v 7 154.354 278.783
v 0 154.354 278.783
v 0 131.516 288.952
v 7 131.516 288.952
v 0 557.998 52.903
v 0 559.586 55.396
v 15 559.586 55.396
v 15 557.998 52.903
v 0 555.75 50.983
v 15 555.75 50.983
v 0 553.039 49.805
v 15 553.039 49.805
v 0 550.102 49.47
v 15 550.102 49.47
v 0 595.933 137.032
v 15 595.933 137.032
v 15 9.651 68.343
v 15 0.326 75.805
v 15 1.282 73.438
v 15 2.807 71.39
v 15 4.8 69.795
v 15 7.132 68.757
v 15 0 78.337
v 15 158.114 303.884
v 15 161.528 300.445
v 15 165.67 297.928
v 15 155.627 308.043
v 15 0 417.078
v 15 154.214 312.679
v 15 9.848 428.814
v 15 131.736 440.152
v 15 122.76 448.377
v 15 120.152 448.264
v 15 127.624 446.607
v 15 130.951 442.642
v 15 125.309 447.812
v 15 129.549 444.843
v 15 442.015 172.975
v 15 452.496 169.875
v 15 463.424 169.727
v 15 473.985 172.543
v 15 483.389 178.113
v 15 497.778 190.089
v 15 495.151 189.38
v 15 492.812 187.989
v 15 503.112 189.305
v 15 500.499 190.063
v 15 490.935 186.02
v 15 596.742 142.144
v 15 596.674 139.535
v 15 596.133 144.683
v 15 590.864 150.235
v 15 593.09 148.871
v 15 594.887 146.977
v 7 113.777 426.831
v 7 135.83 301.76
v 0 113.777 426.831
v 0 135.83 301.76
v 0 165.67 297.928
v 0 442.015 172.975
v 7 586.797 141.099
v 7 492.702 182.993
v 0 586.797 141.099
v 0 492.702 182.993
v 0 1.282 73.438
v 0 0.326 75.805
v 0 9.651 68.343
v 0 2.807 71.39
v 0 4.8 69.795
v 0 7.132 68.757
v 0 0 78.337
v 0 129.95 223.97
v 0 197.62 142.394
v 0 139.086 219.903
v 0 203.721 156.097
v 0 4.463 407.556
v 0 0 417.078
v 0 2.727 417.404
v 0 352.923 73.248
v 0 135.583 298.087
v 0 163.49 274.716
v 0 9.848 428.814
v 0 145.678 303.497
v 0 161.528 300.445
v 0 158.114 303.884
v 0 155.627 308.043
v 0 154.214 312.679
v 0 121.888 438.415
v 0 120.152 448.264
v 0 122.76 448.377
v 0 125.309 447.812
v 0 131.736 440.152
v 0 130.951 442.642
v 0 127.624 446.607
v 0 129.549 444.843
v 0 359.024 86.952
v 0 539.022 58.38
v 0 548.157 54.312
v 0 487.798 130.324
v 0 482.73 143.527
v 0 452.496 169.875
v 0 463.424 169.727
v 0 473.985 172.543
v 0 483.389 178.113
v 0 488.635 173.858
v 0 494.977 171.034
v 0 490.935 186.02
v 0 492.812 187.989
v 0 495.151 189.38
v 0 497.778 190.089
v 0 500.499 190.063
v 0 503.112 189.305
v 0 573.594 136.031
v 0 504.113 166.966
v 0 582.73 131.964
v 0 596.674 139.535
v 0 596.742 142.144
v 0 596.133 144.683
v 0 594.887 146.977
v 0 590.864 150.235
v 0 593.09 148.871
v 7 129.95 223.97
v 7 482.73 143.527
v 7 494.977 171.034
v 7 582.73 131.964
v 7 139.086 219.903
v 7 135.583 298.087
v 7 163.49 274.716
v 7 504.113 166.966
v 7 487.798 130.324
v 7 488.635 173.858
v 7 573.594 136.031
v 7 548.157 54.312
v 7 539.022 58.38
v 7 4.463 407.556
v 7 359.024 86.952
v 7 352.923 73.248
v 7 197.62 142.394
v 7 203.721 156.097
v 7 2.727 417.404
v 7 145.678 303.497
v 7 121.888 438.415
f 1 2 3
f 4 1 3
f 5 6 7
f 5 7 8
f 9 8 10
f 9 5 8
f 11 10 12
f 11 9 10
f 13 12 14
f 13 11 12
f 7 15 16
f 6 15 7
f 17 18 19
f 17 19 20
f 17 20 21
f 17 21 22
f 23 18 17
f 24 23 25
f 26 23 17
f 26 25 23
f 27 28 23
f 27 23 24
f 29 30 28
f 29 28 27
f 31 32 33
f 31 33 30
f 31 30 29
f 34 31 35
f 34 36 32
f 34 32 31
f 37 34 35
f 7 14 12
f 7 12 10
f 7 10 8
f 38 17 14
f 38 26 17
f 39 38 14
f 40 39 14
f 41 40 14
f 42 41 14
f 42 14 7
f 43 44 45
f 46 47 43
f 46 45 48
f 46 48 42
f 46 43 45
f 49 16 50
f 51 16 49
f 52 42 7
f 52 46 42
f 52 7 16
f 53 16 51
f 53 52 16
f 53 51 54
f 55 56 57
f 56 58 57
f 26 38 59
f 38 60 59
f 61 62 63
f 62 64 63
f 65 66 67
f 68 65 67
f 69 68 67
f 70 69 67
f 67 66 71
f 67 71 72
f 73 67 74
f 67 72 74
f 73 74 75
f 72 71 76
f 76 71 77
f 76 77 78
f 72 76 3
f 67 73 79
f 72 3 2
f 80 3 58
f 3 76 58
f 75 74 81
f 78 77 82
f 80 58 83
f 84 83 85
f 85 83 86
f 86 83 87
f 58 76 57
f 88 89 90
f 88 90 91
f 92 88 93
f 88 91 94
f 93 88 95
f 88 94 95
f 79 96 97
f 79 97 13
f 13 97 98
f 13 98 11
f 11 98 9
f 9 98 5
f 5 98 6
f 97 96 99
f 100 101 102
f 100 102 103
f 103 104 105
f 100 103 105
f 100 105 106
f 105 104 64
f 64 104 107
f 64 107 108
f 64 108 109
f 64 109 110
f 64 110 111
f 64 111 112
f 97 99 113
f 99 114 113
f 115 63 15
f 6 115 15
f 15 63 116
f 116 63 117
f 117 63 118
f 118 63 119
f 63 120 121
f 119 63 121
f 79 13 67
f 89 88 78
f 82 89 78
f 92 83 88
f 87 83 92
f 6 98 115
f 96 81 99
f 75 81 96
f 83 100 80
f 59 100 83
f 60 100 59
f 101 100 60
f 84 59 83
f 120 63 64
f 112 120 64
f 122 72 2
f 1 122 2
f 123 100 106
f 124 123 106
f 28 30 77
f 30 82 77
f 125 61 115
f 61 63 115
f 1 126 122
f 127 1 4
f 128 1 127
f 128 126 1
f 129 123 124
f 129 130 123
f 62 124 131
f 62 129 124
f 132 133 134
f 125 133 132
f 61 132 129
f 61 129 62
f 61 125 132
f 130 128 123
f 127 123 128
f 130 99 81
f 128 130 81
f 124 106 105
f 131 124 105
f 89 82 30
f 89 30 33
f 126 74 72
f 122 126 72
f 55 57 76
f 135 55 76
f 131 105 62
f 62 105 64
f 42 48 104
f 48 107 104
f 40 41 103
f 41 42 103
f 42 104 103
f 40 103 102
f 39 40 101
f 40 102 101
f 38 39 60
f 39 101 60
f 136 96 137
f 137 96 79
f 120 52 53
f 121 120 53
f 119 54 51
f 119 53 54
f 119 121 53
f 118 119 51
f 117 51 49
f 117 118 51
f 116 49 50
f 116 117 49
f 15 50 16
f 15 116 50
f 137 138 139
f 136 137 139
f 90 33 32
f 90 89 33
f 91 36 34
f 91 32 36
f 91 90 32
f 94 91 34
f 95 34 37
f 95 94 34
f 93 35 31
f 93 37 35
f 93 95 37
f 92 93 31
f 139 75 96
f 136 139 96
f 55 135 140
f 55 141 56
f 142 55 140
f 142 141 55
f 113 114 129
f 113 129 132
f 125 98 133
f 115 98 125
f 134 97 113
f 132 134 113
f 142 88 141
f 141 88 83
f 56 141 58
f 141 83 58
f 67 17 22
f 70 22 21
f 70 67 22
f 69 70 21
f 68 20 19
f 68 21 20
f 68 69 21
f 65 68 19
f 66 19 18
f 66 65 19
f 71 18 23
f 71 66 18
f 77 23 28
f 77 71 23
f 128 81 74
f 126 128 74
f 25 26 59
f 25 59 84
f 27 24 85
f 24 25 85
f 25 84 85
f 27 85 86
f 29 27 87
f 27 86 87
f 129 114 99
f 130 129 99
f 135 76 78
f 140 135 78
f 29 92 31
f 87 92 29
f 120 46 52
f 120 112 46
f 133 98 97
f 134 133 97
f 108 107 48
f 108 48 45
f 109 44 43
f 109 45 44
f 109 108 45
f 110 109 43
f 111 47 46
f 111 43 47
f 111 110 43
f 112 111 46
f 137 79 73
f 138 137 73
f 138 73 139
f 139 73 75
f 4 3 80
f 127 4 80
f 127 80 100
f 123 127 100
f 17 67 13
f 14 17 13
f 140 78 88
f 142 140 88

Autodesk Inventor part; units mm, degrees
ref_plane "YZ Plane" through (0, 0, 0) normal (1, 0, 0) x (0, 1, 0)
ref_plane "XZ Plane" through (0, 0, 0) normal (0, 1, 0) x (-1, 0, 0)
ref_plane "XY Plane" through (0, 0, 0) normal (0, 0, 1) x (1, 0, 0)
sketch "Sketch1" plane through (0, 0, 0) normal (1, 0, 0) x (0, 1, 0)
  line L0 (9.8481, 428.814) -> (120.1519, 448.2635)
  line L1 (131.7365, 440.1519) -> (154.2135, 312.6787)
  line L2 (0, 78.3368) -> (0, 427.0775)
  line L3 (0, 417.0775) -> (0, 78.3368)
  line L4 (503.1119, 189.3047) -> (590.8645, 150.2346)
  line L5 (595.9326, 137.0318) -> (559.5861, 55.3964)
  line L6 (494.9423, 192.942) -> (494.9423, 192.942)
  line L7 (442.0149, 172.9748) -> (165.6696, 297.928)
  arc A0 (442.0149, 172.9748) -> (490.9347, 186.0198) centre (458.495, 209.4221) ccw
  arc A1 (154.2135, 312.6787) -> (165.6696, 297.928) centre (173.9096, 316.1516) ccw
  arc A2 (131.7365, 440.1519) -> (120.1519, 448.2635) centre (121.8884, 438.4154) ccw
  line L8 (9.8481, 428.814) -> (0, 417.0775)
  arc A3 (595.9326, 137.0318) -> (590.8645, 150.2346) centre (586.7972, 141.0991) ccw
  arc A4 (503.1119, 189.3047) -> (490.9347, 186.0198) centre (499.0446, 180.1692) ccw
  line L9 (9.651, 68.3429) -> (550.1017, 49.4699)
  arc A5 (550.1017, 49.4699) -> (559.5861, 55.3964) centre (550.4507, 59.4638) ccw
  arc A6 (0, 78.3368) -> (9.651, 68.3429) centre (10, 78.3368) ccw
  point P0 (0, 0)
  point P1 (0, 0)
  point P2 (130, 450)
  point P3 (156.0472, 302.2788)
  point P4 (0, 0)
  point P5 (534.922, 0)
  point P6 (600, 146.1672)
  point P7 (478.4622, 156.4947)
  point P8 (0, 427.0775)
  point P9 (537.6655, 6.1619)
  point P10 (0, 417.0775)
  dimension "d0" = 130
  dimension "d1" = 404.922
  dimension "d3" = 150
  dimension "d5" = 115
  dimension "d7" = 10
  dimension "d9" = 40
  dimension "d10" = 40
  dimension "d11" = 20
  dimension "d12" = 10
  dimension "d13" = 10
  dimension "d14" = 10
  dimension "d21" = 10
extrude "Extrusion1" add sketch "Sketch1" along normal blind 15
sketch "Sketch2" plane through (0, 0, 0) normal (-1, 0, 0) x (0, 0, 1)
  point P0 (0, 0)
sketch "Sketch3" plane through (0, 0, 0) normal (-1, 0, 0) x (0, 0, 1)
  line L0 (171.0338, 494.9772) -> (173.8576, 488.6347) projected
  line L1 (166.9664, 504.1126) -> (130.324, 487.7983) projected
  line L2 (130.324, 487.7983) -> (274.7158, 163.4898) projected
  line L3 (274.7158, 163.4898) -> (219.9031, 139.0856) projected
  line L4 (219.9031, 139.0856) -> (223.9704, 129.9501) projected
  line L5 (223.9704, 129.9501) -> (278.7831, 154.3544) projected
  line L6 (278.7831, 154.3544) -> (288.9516, 131.5158) projected
  line L7 (288.9516, 131.5158) -> (298.087, 135.5831) projected
  line L8 (298.087, 135.5831) -> (143.5268, 482.7303) projected
  line L9 (143.5268, 482.7303) -> (171.0338, 494.9772) projected
  line L10 (173.8576, 488.6347) -> (182.9931, 492.702) projected
  line L11 (182.9931, 492.702) -> (141.0991, 586.7972) projected
  line L12 (141.0991, 586.7972) -> (131.9637, 582.7298) projected
  line L13 (301.7603, 135.8301) -> (426.8309, 113.7768) projected
  line L14 (426.8309, 113.7768) -> (407.5559, 4.4631) projected
  line L15 (407.5559, 4.4631) -> (417.404, 2.7267) projected
  line L16 (417.404, 2.7267) -> (438.4154, 121.8884) projected
  line L17 (438.4154, 121.8884) -> (303.4968, 145.6782) projected
  line L18 (303.4968, 145.6782) -> (301.7603, 135.8301) projected
  line L19 (428.814, 9.8481) -> (417.0775, 0) projected
  line L20 (417.0775, 0) -> (78.3368, 0) projected
  line L21 (55.3964, 559.5861) -> (137.0318, 595.9326) projected
  arc A0 (150.2346, 590.8645) -> (137.0318, 595.9326) centre (141.0991, 586.7972) ccw projected
  line L22 (150.2346, 590.8645) -> (189.3047, 503.1119) projected
  arc A1 (186.0198, 490.9347) -> (189.3047, 503.1119) centre (180.1692, 499.0446) ccw projected
  arc A2 (186.0198, 490.9347) -> (172.9748, 442.0149) centre (209.4221, 458.495) ccw projected
  line L23 (172.9748, 442.0149) -> (297.928, 165.6696) projected
  arc A3 (297.928, 165.6696) -> (312.6787, 154.2135) centre (316.1516, 173.9096) ccw projected
  line L24 (312.6787, 154.2135) -> (440.1519, 131.7365) projected
  arc A4 (448.2635, 120.1519) -> (440.1519, 131.7365) centre (438.4154, 121.8884) ccw projected
  line L25 (448.2635, 120.1519) -> (428.814, 9.8481) projected
  line L26 (171.0338, 494.9772) -> (173.8576, 488.6347) projected
  line L27 (166.9664, 504.1126) -> (130.324, 487.7983) projected
  line L28 (130.324, 487.7983) -> (274.7158, 163.4898) projected
  line L29 (274.7158, 163.4898) -> (219.9031, 139.0856) projected
  line L30 (219.9031, 139.0856) -> (223.9704, 129.9501) projected
  line L31 (223.9704, 129.9501) -> (278.7831, 154.3544) projected
  line L32 (278.7831, 154.3544) -> (288.9516, 131.5158) projected
  line L33 (288.9516, 131.5158) -> (298.087, 135.5831) projected
  line L34 (298.087, 135.5831) -> (143.5268, 482.7303) projected
  line L35 (143.5268, 482.7303) -> (171.0338, 494.9772) projected
  line L36 (173.8576, 488.6347) -> (182.9931, 492.702) projected
  line L37 (182.9931, 492.702) -> (141.0991, 586.7972) projected
  line L38 (141.0991, 586.7972) -> (131.9637, 582.7298) projected
  line L39 (301.7603, 135.8301) -> (426.8309, 113.7768) projected
  line L40 (426.8309, 113.7768) -> (407.5559, 4.4631) projected
  line L41 (407.5559, 4.4631) -> (417.404, 2.7267) projected
  line L42 (417.404, 2.7267) -> (438.4154, 121.8884) projected
  line L43 (438.4154, 121.8884) -> (303.4968, 145.6782) projected
  line L44 (303.4968, 145.6782) -> (301.7603, 135.8301) projected
  line L45 (428.814, 9.8481) -> (417.0775, 0) projected
  line L46 (417.0775, 0) -> (78.3368, 0) projected
  line L47 (55.3964, 559.5861) -> (137.0318, 595.9326) projected
  arc A5 (150.2346, 590.8645) -> (137.0318, 595.9326) centre (141.0991, 586.7972) ccw projected
  line L48 (150.2346, 590.8645) -> (189.3047, 503.1119) projected
  arc A6 (186.0198, 490.9347) -> (189.3047, 503.1119) centre (180.1692, 499.0446) ccw projected
  arc A7 (186.0198, 490.9347) -> (172.9748, 442.0149) centre (209.4221, 458.495) ccw projected
  line L49 (172.9748, 442.0149) -> (297.928, 165.6696) projected
  arc A8 (297.928, 165.6696) -> (312.6787, 154.2135) centre (316.1516, 173.9096) ccw projected
  line L50 (312.6787, 154.2135) -> (440.1519, 131.7365) projected
  arc A9 (448.2635, 120.1519) -> (440.1519, 131.7365) centre (438.4154, 121.8884) ccw projected
  line L51 (448.2635, 120.1519) -> (428.814, 9.8481) projected
  line L52 (417.404, 2.7267) -> (438.4154, 121.8884) projected
  line L53 (58.3797, 539.0217) -> (136.0311, 573.5943)
  line L54 (54.3124, 548.1571) -> (141.0991, 586.7972)
  line L55 (136.0311, 573.5943) -> (131.9637, 582.7298)
  line L56 (141.0991, 586.7972) -> (182.9931, 492.702)
  line L57 (182.9931, 492.702) -> (173.8576, 488.6347)
  line L58 (166.9664, 504.1126) -> (136.0311, 573.5943)
  line L59 (166.9664, 504.1126) -> (130.324, 487.7983)
  line L60 (130.324, 487.7983) -> (274.7158, 163.4898)
  line L61 (274.7158, 163.4898) -> (219.9031, 139.0856)
  line L62 (219.9031, 139.0856) -> (223.9704, 129.9501)
  line L63 (223.9704, 129.9501) -> (278.7831, 154.3544)
  line L64 (278.7831, 154.3544) -> (288.9516, 131.5158)
  line L65 (288.9516, 131.5158) -> (298.087, 135.5831)
  line L66 (298.087, 135.5831) -> (143.5268, 482.7303)
  line L67 (143.5268, 482.7303) -> (171.0338, 494.9772)
  line L68 (171.0338, 494.9772) -> (173.8576, 488.6347)
  line L69 (303.4968, 145.6782) -> (301.7603, 135.8301)
  line L70 (301.7603, 135.8301) -> (426.8309, 113.7768)
  line L71 (426.8309, 113.7768) -> (407.5559, 4.4631)
  line L72 (407.5559, 4.4631) -> (417.404, 2.7267)
  line L73 (417.404, 2.7267) -> (438.4154, 121.8884)
  line L74 (438.4154, 121.8884) -> (303.4968, 145.6782)
  line L75 (131.9637, 582.7298) -> (54.3123, 548.1572) projected
  line L76 (54.3123, 548.1572) -> (58.3797, 539.0217) projected
  line L77 (58.3797, 539.0217) -> (136.0311, 573.5943) projected
  line L78 (136.0311, 573.5943) -> (166.9664, 504.1126) projected
  line L79 (68.3429, 9.651) -> (49.4699, 550.1017) projected
  arc A10 (55.3964, 559.5861) -> (49.4699, 550.1017) centre (59.4638, 550.4507) ccw projected
  arc A11 (68.3429, 9.651) -> (78.3368, 0) centre (78.3368, 10) ccw projected
  line L80 (131.9637, 582.7298) -> (54.3123, 548.1572) projected
  line L81 (54.3123, 548.1572) -> (58.3797, 539.0217) projected
  line L82 (58.3797, 539.0217) -> (136.0311, 573.5943) projected
  line L83 (136.0311, 573.5943) -> (166.9664, 504.1126) projected
  line L84 (68.3429, 9.651) -> (49.4699, 550.1017) projected
  arc A12 (55.3964, 559.5861) -> (49.4699, 550.1017) centre (59.4638, 550.4507) ccw projected
  arc A13 (68.3429, 9.651) -> (78.3368, 0) centre (78.3368, 10) ccw projected
  line L85 (54.3123, 548.1572) -> (58.3797, 539.0217)
  line L86 (73.2484, 352.9229) -> (142.3938, 197.6203) projected
  line L87 (142.3938, 197.6203) -> (156.0969, 203.7213) projected
  line L88 (156.0969, 203.7213) -> (86.9516, 359.024) projected
  line L89 (86.9516, 359.024) -> (73.2484, 352.9229) projected
  line L90 (73.2484, 352.9229) -> (142.3938, 197.6203) projected
  line L91 (142.3938, 197.6203) -> (156.0969, 203.7213) projected
  line L92 (156.0969, 203.7213) -> (86.9516, 359.024) projected
  line L93 (86.9516, 359.024) -> (73.2484, 352.9229) projected
  line L94 (86.9516, 359.024) -> (156.0969, 203.7213)
  line L95 (142.3938, 197.6203) -> (156.0969, 203.7213)
  line L96 (142.3938, 197.6203) -> (73.2484, 352.9229)
  line L97 (73.2484, 352.9229) -> (86.9516, 359.024)
  point P0 (0, 0)
  point P1 (131.9642, 582.73)
extrude "Extrusion2" cut sketch "Sketch3" against normal blind 7 contours L9 L8 L7 L6 L5 L4 L3 L2 L1 L58 L55 L12 L11 L10 L0 | L55 L53 L76 L54 | L18 L17 L16 L15 L14 L13 | L89 L88 L87 L86
equation "\"d14\" = d13"
properties part number "Arcade_Right"
